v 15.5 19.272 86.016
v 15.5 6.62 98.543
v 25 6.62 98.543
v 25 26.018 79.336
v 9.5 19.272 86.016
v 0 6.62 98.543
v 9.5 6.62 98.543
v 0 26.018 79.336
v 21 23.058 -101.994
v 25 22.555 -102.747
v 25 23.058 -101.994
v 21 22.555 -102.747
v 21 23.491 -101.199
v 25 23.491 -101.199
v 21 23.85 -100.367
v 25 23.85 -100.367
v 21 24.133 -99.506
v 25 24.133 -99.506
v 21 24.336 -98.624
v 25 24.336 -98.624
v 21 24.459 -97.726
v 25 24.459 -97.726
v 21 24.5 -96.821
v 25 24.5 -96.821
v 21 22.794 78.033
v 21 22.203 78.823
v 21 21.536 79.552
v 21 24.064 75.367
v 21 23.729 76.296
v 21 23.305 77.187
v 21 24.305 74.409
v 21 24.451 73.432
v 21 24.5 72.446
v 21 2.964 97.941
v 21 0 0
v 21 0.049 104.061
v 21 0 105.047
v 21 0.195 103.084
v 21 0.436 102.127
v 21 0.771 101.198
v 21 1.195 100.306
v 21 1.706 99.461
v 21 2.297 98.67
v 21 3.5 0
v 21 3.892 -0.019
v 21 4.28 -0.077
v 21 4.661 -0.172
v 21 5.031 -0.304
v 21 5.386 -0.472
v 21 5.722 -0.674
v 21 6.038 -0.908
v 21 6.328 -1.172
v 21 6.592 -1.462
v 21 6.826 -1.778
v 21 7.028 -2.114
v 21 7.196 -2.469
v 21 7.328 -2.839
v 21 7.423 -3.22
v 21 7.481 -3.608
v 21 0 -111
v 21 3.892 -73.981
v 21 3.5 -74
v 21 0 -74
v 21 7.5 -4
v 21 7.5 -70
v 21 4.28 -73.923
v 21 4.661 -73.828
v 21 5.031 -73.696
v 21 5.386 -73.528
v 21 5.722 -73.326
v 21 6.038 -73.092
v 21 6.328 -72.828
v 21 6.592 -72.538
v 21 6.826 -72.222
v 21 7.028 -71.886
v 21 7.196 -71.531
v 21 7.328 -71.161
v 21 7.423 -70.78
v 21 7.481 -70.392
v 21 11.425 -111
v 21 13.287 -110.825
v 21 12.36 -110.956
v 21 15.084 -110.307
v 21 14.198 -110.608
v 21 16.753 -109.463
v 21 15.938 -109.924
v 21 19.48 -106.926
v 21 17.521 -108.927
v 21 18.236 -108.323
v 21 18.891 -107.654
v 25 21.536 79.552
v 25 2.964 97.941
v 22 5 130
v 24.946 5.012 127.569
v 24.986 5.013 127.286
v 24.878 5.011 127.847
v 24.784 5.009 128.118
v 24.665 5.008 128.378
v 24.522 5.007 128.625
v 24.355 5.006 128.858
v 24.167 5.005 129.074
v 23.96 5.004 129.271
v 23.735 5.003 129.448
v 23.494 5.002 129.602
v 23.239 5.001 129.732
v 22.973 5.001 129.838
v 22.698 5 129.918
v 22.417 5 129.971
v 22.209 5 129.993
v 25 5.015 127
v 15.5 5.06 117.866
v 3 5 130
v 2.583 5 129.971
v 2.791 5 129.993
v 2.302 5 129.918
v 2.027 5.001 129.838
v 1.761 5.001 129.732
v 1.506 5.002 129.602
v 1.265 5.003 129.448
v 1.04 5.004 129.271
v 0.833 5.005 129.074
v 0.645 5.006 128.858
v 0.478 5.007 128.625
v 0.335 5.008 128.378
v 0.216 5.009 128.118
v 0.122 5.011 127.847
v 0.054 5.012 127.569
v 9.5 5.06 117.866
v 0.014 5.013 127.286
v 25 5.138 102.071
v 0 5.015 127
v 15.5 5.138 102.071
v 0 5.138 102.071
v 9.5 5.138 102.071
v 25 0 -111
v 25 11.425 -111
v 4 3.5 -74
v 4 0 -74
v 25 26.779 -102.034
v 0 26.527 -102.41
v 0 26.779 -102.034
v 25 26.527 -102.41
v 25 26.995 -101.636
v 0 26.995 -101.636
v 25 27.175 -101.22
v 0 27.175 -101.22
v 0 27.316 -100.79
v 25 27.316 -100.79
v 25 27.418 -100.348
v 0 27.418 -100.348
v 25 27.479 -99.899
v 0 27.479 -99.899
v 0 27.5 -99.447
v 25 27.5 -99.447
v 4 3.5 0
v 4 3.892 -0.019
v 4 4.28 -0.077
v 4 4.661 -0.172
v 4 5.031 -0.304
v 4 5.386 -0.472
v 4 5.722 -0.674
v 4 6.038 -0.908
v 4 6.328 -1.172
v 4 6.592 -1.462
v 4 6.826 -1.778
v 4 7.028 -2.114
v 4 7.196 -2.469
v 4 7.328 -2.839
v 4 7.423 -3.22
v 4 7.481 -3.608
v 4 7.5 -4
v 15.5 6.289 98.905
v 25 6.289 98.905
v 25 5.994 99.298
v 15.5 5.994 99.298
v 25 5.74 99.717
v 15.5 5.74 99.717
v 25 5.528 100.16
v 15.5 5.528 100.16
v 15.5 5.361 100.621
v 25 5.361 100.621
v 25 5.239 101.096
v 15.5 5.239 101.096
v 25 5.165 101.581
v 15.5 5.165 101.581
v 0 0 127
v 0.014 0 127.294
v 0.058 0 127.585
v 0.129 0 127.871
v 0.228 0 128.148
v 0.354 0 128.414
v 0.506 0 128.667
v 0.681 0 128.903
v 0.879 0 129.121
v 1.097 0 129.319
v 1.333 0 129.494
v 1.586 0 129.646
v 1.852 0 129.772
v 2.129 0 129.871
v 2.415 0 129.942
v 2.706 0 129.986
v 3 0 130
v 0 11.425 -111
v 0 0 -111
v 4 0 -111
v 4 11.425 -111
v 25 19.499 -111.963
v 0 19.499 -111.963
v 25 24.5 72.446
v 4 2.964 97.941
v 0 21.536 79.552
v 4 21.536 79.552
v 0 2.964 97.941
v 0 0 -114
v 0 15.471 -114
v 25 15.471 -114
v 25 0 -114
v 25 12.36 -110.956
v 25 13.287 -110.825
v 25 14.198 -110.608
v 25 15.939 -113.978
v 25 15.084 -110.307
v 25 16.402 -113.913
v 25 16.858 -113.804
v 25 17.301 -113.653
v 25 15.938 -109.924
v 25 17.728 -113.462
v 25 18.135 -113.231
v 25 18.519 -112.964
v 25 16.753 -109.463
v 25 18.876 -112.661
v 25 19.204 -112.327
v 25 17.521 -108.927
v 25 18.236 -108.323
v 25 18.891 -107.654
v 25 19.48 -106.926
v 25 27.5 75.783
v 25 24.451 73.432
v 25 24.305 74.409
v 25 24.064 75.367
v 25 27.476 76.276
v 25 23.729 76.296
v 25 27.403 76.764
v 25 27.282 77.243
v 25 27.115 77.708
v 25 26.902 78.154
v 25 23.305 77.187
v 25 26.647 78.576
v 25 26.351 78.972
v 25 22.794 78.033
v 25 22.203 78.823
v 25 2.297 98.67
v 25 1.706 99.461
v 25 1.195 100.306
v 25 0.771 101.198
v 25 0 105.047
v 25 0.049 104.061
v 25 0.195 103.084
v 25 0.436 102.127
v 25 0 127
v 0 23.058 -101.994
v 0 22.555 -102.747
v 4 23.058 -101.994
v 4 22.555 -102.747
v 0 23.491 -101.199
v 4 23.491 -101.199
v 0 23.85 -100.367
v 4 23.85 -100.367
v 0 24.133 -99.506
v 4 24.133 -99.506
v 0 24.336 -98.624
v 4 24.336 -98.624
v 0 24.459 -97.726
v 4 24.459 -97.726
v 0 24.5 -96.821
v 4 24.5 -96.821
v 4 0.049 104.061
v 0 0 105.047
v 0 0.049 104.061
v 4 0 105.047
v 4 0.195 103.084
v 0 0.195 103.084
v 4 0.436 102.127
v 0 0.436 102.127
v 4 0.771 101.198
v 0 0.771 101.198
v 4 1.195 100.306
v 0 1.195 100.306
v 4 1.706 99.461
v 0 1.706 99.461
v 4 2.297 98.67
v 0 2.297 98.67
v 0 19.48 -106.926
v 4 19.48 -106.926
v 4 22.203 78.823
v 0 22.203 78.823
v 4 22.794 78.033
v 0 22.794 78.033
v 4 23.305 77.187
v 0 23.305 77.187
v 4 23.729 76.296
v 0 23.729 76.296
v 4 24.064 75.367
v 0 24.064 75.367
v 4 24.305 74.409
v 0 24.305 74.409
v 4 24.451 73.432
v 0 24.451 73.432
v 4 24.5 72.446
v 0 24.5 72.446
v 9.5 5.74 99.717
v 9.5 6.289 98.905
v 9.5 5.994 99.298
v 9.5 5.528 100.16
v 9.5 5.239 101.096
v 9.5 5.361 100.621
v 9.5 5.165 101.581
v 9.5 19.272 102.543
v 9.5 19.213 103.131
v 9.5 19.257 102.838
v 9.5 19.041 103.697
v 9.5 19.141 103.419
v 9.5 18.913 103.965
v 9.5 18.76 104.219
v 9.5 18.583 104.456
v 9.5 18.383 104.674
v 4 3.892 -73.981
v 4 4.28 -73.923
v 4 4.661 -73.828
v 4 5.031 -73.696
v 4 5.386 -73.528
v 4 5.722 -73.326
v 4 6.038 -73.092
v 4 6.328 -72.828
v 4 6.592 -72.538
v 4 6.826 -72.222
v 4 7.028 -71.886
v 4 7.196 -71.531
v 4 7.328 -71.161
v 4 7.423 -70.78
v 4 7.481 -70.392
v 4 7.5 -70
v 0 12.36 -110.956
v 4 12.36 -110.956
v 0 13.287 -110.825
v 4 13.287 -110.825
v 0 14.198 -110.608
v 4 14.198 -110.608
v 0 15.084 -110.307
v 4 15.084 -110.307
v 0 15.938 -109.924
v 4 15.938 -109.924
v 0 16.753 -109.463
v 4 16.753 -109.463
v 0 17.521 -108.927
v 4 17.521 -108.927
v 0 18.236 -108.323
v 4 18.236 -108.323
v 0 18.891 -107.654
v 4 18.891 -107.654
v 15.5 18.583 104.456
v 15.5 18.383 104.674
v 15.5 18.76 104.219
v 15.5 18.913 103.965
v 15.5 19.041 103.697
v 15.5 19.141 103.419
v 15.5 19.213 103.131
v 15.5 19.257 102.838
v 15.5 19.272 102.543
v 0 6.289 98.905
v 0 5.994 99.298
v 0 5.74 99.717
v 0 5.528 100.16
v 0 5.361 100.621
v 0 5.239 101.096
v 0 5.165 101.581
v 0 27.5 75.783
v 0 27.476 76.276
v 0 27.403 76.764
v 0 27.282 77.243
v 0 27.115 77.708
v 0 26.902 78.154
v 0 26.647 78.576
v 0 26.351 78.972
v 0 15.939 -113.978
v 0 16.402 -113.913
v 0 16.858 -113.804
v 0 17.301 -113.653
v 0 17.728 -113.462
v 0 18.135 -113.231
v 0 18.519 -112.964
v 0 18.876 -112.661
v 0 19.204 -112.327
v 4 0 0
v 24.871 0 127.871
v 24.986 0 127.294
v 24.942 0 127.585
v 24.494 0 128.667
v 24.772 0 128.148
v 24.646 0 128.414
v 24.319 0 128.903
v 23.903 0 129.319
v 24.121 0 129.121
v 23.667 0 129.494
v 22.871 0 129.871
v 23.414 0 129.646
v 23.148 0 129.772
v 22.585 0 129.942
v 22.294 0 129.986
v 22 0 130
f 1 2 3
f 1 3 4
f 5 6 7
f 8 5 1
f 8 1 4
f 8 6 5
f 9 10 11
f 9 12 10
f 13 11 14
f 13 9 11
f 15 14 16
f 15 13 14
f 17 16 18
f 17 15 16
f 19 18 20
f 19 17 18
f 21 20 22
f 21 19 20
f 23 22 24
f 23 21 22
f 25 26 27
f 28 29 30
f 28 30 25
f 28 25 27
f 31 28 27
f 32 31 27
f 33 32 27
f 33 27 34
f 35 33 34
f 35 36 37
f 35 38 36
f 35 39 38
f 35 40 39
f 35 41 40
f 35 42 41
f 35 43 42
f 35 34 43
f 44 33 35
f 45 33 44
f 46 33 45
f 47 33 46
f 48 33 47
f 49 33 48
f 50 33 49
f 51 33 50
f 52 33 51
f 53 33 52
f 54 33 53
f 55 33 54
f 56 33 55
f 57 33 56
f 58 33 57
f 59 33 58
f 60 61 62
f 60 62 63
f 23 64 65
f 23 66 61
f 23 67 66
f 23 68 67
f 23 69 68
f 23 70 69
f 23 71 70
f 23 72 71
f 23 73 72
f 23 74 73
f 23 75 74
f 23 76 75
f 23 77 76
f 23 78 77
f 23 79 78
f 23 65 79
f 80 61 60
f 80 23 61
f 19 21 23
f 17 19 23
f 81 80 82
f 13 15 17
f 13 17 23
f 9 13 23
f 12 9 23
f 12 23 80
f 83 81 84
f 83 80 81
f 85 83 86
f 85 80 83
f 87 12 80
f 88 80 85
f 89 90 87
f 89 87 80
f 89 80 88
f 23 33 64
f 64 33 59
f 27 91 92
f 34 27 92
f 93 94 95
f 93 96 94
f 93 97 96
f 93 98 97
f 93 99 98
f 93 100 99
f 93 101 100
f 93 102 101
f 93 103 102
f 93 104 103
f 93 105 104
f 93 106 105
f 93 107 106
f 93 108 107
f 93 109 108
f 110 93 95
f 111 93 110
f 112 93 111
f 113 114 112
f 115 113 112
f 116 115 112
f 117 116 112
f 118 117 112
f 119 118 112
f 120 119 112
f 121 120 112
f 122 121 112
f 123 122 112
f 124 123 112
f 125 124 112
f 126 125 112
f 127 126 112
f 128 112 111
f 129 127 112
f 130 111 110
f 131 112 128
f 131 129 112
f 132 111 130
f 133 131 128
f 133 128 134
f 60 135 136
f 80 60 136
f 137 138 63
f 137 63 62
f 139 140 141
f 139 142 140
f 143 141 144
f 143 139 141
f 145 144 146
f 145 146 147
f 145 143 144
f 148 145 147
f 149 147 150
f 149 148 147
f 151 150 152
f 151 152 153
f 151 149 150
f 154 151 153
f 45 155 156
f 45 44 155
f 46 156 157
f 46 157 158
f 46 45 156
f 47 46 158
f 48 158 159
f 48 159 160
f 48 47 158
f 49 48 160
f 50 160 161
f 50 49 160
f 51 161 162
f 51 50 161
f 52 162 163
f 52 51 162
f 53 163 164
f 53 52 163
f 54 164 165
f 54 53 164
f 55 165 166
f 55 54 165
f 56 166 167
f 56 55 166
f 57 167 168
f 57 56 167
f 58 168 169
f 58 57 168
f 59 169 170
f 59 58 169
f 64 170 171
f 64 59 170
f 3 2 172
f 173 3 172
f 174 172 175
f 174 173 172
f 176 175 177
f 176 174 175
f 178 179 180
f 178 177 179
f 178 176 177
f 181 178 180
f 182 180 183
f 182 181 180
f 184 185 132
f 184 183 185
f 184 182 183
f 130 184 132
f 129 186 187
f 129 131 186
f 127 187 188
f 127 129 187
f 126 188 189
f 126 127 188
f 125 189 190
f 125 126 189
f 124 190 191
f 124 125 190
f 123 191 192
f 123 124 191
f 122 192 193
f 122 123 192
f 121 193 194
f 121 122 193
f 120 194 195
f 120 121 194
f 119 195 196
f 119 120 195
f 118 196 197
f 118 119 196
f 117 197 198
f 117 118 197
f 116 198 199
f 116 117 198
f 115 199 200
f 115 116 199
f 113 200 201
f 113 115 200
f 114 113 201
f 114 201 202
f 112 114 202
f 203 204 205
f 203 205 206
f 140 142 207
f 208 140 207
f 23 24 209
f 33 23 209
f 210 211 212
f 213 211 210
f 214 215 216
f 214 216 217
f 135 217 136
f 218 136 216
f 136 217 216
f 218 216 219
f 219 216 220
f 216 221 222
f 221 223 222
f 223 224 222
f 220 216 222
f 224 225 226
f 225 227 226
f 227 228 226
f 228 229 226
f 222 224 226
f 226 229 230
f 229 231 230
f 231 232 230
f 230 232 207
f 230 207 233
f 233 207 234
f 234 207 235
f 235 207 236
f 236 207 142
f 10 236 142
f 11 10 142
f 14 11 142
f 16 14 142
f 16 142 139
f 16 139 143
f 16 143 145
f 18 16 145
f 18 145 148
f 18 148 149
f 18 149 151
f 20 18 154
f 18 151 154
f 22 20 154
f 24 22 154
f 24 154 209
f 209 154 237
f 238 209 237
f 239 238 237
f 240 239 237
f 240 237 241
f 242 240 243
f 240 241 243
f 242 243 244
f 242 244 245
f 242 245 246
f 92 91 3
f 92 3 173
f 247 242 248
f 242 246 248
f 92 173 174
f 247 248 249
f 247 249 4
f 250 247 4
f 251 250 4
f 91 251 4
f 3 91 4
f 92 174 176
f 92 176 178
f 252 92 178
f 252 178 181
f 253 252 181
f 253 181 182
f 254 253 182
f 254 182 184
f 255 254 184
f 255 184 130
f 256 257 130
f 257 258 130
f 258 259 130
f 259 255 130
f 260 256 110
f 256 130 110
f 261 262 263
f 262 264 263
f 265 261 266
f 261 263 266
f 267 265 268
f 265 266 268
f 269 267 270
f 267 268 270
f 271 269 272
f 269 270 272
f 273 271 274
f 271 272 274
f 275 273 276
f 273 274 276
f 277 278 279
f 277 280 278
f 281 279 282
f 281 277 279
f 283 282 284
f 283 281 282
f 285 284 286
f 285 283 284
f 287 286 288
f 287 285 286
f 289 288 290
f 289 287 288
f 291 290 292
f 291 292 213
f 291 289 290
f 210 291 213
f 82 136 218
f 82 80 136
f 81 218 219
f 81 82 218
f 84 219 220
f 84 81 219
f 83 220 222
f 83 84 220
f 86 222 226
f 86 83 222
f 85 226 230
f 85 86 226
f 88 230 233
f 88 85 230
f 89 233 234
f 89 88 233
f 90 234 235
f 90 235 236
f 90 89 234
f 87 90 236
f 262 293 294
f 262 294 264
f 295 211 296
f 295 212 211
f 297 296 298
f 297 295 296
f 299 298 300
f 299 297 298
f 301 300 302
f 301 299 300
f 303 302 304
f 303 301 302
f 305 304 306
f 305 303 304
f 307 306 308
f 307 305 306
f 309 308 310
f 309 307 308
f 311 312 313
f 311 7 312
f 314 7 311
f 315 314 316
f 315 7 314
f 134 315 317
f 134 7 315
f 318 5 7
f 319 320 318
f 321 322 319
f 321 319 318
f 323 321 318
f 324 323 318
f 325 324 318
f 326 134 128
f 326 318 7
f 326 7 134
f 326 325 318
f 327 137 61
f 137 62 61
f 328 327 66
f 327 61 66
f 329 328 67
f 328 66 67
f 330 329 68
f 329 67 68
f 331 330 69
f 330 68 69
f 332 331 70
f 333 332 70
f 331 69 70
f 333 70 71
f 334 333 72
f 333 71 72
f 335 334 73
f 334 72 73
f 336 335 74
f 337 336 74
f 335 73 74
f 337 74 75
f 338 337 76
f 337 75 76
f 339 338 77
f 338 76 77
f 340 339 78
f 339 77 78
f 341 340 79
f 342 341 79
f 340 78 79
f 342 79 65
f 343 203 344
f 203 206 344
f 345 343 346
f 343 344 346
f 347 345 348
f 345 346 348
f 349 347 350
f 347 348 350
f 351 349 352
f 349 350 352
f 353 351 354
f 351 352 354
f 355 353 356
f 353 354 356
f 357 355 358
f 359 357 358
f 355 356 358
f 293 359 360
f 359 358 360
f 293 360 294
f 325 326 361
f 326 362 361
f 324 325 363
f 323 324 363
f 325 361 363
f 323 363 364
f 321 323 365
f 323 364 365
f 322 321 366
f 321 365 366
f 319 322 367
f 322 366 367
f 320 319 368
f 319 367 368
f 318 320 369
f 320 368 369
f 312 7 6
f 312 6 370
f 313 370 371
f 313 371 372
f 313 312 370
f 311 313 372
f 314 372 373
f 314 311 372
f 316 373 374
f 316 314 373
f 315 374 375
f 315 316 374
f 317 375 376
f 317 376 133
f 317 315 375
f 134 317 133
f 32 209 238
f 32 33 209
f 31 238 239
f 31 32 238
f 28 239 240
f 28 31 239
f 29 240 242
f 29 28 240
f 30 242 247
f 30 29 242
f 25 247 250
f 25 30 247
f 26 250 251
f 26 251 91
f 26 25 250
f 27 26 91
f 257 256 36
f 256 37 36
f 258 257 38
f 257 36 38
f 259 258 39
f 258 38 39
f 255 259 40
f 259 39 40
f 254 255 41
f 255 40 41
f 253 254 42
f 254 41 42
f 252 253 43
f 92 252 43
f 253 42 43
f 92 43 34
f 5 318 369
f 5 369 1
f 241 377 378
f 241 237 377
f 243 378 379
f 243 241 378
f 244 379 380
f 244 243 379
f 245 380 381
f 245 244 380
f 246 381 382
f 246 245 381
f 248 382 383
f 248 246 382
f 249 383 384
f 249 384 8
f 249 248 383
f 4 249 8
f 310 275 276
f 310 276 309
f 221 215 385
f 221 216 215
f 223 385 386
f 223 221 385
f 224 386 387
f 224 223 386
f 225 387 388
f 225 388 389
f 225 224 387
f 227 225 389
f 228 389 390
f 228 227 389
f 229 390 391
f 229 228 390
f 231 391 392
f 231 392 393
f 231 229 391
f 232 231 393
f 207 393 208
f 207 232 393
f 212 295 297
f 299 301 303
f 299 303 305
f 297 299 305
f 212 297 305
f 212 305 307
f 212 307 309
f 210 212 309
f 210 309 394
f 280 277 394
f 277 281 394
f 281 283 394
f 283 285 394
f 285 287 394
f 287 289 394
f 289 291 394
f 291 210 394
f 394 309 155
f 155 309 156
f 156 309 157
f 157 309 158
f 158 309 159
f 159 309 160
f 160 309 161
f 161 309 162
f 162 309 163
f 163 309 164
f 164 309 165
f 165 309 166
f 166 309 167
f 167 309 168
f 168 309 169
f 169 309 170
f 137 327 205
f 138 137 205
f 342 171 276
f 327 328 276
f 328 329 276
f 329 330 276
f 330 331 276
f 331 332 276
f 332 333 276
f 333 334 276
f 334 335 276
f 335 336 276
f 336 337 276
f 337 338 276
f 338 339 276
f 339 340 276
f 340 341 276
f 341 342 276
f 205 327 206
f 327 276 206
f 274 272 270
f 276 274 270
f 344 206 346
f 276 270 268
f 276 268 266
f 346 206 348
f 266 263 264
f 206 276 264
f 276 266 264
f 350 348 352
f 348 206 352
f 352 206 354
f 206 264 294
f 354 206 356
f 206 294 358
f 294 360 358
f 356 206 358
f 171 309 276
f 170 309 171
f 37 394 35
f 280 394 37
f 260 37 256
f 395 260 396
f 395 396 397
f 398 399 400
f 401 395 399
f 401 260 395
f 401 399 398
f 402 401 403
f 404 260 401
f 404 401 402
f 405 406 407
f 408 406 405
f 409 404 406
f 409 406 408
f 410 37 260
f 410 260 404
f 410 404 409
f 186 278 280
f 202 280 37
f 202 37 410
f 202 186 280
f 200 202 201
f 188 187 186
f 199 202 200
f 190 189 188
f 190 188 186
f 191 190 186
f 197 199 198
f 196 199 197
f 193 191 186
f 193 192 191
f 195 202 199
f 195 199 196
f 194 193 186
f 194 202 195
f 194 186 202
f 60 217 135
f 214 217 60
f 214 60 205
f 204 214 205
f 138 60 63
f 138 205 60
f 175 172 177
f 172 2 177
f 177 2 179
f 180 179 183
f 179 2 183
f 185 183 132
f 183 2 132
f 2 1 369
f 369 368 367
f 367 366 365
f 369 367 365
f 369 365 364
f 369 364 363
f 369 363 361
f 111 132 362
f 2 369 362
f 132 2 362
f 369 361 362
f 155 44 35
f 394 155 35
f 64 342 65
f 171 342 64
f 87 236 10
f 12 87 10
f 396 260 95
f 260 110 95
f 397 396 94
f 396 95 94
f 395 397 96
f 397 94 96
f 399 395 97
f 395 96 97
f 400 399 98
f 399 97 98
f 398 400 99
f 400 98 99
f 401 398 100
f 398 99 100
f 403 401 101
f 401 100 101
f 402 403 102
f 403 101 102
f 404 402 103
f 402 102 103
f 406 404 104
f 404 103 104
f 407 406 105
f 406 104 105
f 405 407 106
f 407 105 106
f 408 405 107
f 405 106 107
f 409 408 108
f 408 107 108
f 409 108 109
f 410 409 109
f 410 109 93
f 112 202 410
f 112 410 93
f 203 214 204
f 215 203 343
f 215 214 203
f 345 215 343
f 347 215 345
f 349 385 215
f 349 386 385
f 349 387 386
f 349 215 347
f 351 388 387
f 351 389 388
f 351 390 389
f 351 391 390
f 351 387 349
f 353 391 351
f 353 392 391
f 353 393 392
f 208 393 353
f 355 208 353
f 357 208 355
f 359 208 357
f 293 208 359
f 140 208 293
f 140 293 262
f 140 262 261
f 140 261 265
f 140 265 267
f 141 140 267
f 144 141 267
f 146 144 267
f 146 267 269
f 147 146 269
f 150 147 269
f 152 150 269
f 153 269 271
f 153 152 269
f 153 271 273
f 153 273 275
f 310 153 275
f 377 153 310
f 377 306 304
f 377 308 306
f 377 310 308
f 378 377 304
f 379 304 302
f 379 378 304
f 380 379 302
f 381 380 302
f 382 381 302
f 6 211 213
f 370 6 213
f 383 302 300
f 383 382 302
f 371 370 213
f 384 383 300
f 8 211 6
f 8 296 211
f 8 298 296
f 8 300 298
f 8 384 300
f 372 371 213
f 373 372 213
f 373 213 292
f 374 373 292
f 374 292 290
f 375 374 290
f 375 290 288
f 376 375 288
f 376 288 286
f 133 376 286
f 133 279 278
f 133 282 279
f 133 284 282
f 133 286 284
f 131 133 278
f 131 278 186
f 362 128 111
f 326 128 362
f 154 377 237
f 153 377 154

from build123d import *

# Parameters (mm, degrees)
BOSS_EXTRUDE1_DEPTH      = 25
CUT_EXTRUDE1_DEPTH       = 4
FILLET1_R                = 4
FILLET2_R                = 10
FILLET3_R                = 5
FILLET4_R                = 3
BOSS_EXTRUDE2_DEPTH      = 3
BOSS_EXTRUDE2_DEPTH_BACK = 3
FILLET5_R                = 3


with BuildPart() as part:
    # Sketch1 → Boss-Extrude1 (new body)
    with BuildSketch(Plane(origin=(0, 0, 0), x_dir=(0, 0, -1), z_dir=(1, 0, 0))):
        Polygon((0, 0), (-130, 0), (-130, 5), (-100.000366453, 5.148280317), (-77.868517379, 27.5), (101.088229162, 27.5), (114, 18), (114, 0), (74, 0), (74, 7.5), (0, 7.5), align=None)
    extrude(amount=BOSS_EXTRUDE1_DEPTH)

    # Sketch4 → Cut-Extrude1 (cut)
    with BuildSketch(Plane(origin=(25, 0, 0), x_dir=(0, 0, -1), z_dir=(1, 0, 0))):
        Polygon((-100.876178749, 0), (0, 0), (111, 0), (111, 3), (111, 16.482758557), (100.103496394, 24.5), (-76.617181678, 24.5), align=None)
    cut_extrude1 = extrude(amount=-CUT_EXTRUDE1_DEPTH, mode=Mode.SUBTRACT)

    # Mirror2: Cut-Extrude1 across plane
    add(cut_extrude1.mirror(Plane(origin=(12.5, 0, 0), x_dir=(0, 0, 1), z_dir=(1, 0, 0))), mode=Mode.SUBTRACT)

    # Fillet1
    fillet1_edges = [part.edges().sort_by_distance(p)[0] for p in [
        (12.5, 7.5, -74),
        (12.5, 7.5, 0),
    ]]
    fillet(fillet1_edges, radius=FILLET1_R)

    # Fillet2
    fillet2_edges = [part.edges().sort_by_distance(p)[0] for p in [
        (23, 0, 100.876178749),
        (23, 24.5, 76.617181678),
        (23, 24.5, -100.103496394),
        (23, 16.482758557, -111),
        (2, 0, 100.876178749),
        (2, 16.482758557, -111),
        (2, 24.5, -100.103496394),
        (2, 24.5, 76.617181678),
    ]]
    fillet(fillet2_edges, radius=FILLET2_R)

    # Fillet3
    fillet3_edges = [part.edges().sort_by_distance(p)[0] for p in [
        (12.5, 5.148280317, 100.000366453),
        (12.5, 27.5, 77.868517379),
        (12.5, 27.5, -101.088229162),
        (12.5, 18, -114),
    ]]
    fillet(fillet3_edges, radius=FILLET3_R)

    # Fillet4
    fillet4_edges = [part.edges().sort_by_distance(p)[0] for p in [
        (0, 2.5, 130),
        (25, 2.5, 130),
    ]]
    fillet(fillet4_edges, radius=FILLET4_R)

    # Sketch5 → Boss-Extrude2 (add, two sides: drawn at the far end of the back side and taken through both)
    with BuildSketch(Plane(origin=(12.5, 0, 0), x_dir=(0, 0, -1), z_dir=(1, 0, 0)).offset(-BOSS_EXTRUDE2_DEPTH_BACK)):
        Polygon((-117.8659777, 5.059975288), (-103.793914836, 19.271838176), (-72.605250228, 19.271838176), (-95.8659777, 5.059975288), align=None)
    extrude(amount=BOSS_EXTRUDE2_DEPTH + BOSS_EXTRUDE2_DEPTH_BACK)

    # Fillet5
    fillet5_edges = [part.edges().sort_by_distance(p)[0] for p in [
        (12.5, 19.271838176, 103.793914836),
    ]]
    fillet(fillet5_edges, radius=FILLET5_R)


solid = part.part
